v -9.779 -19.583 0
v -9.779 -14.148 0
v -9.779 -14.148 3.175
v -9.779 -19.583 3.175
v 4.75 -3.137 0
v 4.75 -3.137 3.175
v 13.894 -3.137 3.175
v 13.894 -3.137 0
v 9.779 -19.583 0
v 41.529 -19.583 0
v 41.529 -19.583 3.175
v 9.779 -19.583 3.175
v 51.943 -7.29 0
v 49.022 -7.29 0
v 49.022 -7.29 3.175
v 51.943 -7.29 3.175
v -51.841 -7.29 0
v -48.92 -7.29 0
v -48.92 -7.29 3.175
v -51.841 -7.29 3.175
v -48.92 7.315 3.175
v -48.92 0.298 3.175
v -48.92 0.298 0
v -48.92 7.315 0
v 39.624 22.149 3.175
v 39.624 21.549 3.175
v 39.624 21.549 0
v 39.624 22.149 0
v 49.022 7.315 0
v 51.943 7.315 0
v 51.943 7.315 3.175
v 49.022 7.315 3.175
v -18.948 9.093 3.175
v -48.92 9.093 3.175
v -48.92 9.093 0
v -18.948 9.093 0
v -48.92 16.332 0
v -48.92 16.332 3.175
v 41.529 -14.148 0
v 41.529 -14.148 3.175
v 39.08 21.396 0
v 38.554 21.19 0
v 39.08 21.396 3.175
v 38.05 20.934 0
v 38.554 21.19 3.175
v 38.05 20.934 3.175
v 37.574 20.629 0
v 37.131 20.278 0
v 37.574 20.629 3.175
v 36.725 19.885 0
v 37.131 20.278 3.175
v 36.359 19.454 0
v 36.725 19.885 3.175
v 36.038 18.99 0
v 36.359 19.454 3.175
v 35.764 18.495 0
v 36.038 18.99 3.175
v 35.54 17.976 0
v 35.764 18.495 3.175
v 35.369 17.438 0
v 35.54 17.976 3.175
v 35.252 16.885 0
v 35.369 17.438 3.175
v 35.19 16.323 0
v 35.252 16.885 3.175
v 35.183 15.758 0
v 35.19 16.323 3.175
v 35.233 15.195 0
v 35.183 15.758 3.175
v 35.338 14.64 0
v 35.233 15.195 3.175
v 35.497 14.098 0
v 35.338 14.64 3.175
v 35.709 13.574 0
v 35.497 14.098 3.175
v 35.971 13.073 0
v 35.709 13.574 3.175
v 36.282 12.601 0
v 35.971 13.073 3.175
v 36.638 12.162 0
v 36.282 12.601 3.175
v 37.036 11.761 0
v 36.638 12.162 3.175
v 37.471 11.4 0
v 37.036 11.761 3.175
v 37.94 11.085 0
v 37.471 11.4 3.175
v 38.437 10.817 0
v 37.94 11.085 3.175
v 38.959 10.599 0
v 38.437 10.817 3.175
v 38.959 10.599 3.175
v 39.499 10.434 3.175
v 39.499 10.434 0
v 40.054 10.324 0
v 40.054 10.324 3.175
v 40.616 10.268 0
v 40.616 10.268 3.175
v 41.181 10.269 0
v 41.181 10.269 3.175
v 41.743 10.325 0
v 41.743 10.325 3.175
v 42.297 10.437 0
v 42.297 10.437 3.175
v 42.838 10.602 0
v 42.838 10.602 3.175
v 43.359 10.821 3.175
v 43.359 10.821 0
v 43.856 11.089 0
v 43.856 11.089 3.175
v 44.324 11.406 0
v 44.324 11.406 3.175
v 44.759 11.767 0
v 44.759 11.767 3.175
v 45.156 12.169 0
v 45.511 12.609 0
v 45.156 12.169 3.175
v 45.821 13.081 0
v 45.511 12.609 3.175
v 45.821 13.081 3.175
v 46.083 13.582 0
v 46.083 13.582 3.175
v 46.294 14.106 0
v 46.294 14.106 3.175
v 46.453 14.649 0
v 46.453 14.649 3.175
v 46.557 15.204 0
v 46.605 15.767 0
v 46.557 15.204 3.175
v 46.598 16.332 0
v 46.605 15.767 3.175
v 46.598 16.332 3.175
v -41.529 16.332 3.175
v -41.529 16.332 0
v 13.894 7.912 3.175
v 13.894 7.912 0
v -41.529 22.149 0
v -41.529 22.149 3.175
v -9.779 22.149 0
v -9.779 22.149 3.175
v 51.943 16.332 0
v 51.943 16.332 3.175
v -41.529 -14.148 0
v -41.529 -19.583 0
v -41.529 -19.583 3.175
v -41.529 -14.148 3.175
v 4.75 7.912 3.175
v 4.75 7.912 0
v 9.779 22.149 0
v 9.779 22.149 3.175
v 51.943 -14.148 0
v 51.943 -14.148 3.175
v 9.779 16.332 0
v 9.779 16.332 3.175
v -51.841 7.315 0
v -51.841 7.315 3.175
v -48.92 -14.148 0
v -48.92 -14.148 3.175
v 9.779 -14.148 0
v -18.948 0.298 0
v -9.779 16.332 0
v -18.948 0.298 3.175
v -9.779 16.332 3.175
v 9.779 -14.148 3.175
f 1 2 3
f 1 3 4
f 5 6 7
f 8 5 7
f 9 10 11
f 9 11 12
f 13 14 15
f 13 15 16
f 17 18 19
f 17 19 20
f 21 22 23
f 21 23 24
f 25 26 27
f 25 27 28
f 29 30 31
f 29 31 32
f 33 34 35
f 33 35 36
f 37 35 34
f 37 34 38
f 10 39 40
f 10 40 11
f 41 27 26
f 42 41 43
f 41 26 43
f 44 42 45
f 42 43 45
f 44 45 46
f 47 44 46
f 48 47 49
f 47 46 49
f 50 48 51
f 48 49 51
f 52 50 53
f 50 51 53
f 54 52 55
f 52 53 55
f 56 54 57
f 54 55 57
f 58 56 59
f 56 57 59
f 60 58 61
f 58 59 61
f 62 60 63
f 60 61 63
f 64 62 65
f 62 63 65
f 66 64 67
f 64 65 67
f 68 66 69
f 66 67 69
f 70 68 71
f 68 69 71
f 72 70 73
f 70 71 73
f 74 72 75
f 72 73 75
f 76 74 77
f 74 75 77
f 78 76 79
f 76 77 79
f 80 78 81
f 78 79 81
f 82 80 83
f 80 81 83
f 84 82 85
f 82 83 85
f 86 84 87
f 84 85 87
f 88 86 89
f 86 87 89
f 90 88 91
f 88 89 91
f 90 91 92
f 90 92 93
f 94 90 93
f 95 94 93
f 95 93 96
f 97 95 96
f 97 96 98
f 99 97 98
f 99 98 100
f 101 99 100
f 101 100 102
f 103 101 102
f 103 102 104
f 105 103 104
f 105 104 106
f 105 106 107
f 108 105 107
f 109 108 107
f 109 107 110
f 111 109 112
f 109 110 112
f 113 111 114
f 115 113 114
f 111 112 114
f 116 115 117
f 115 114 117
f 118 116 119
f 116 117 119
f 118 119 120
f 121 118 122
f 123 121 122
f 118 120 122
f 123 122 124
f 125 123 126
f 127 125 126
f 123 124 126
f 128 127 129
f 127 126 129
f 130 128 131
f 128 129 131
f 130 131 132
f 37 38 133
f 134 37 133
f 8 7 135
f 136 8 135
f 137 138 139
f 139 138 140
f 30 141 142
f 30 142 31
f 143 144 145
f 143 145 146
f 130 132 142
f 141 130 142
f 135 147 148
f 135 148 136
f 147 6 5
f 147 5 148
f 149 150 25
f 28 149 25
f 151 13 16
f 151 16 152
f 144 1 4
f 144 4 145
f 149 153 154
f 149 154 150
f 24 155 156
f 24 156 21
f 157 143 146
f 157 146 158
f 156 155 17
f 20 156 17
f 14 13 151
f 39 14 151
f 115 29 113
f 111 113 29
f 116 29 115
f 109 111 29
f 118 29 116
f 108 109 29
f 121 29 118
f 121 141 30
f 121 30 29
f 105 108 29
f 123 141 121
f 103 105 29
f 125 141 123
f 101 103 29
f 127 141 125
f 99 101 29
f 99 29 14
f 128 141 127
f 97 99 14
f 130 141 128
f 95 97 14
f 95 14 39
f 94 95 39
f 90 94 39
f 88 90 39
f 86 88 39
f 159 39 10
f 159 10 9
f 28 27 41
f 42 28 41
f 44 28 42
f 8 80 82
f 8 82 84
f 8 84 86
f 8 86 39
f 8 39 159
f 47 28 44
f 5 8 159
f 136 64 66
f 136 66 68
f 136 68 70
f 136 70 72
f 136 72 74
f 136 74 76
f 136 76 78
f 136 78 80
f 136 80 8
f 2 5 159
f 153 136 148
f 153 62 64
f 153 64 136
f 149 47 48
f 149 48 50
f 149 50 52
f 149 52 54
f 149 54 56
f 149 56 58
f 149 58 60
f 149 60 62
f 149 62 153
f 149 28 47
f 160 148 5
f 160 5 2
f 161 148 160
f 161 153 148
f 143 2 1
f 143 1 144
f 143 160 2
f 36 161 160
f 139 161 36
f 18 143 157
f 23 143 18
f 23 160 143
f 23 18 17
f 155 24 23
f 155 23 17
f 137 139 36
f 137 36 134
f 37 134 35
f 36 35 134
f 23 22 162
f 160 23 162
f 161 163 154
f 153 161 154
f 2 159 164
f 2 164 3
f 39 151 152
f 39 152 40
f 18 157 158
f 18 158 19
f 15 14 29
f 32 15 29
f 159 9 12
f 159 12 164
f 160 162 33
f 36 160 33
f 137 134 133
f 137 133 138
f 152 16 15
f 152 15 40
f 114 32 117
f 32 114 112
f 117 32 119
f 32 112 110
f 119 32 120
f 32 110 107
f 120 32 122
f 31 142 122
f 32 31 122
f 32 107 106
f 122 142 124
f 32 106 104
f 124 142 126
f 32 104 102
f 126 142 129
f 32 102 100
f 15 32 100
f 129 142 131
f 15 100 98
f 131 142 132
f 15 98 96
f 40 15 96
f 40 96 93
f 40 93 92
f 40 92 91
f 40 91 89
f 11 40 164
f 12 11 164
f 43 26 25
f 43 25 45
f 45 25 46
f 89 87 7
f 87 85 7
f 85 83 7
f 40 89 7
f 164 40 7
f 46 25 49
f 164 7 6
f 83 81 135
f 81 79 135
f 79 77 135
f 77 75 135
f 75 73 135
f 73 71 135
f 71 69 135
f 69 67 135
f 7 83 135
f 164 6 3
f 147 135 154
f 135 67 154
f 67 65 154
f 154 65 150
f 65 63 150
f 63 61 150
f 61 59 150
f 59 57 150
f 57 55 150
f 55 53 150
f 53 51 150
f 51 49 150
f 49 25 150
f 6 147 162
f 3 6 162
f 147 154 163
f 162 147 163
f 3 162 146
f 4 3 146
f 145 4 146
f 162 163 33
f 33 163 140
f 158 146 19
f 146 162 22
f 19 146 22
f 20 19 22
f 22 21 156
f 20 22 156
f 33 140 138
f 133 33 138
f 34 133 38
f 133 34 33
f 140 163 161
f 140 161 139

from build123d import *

# Parameters (mm, degrees)
BOSS_EXTRUDE1_DEPTH = 3.175
SKETCH2_R           = 5.715
SKETCH2_W           = 29.972
SKETCH2_H           = 8.79475
SKETCH2_W_2         = 9.144
SKETCH2_H_2         = 11.049
CUT_EXTRUDE1_DEPTH  = 5.4356
SKETCH3_W           = 1.905
SKETCH3_H           = 1.235097614
CUT_EXTRUDE2_DEPTH  = 57.808955425
SKETCH4_W           = 5.501032945
SKETCH4_H           = 1.016
SKETCH4_W_2         = 19.558
SKETCH4_W_3         = 7.3914
CUT_EXTRUDE3_DEPTH  = 57.808955425
SKETCH5_W           = 31.75
SKETCH5_H           = 0.635
SKETCH5_W_2         = 29.845
CUT_EXTRUDE4_DEPTH  = 57.808955425


with BuildPart() as part:
    # Sketch1 → Boss-Extrude1 (new body)
    with BuildSketch(Plane.XY):
        Polygon((-51.8414, 0), (-51.8414, 7.3152), (-48.9204, 7.3152), (-48.9204, 17.3482), (-41.529, 17.3482), (-41.529, 22.7838), (-9.779, 22.7838), (-9.779, 17.3482), (9.779, 17.3482), (9.779, 22.7838), (41.529, 22.7838), (41.529, 17.3482), (51.943, 17.3482), (51.943, 7.3152), (49.022, 7.3152), (49.022, 0), (49.022, -7.2898), (51.943, -7.2898), (51.943, -14.1478), (41.529, -14.1478), (41.529, -19.5834), (9.779, -19.5834), (9.779, -14.1478), (-9.779, -14.1478), (-9.779, -19.5834), (-41.529, -19.5834), (-41.529, -14.1478), (-48.9204, -14.1478), (-48.9204, -7.2898), (-51.8414, -7.2898), align=None)
    extrude(amount=BOSS_EXTRUDE1_DEPTH)

    # Sketch2 → Cut-Extrude1 (cut)
    with BuildSketch(Plane.XY.offset(3.175)):
        with Locations((40.894, 15.9766)):
            Circle(SKETCH2_R)
        with Locations((-33.9344, 4.695825)):
            Rectangle(SKETCH2_W, SKETCH2_H)
        with Locations((9.3218, 2.3876)):
            Rectangle(SKETCH2_W_2, SKETCH2_H_2)
    extrude(amount=-CUT_EXTRUDE1_DEPTH, mode=Mode.SUBTRACT)

    # Sketch3 → Cut-Extrude2 (cut, through all)
    with BuildSketch(Plane.XY.offset(3.175)):
        with Locations((40.5765, 22.166251193)):
            Rectangle(SKETCH3_W, SKETCH3_H)
    extrude(amount=-CUT_EXTRUDE2_DEPTH, mode=Mode.SUBTRACT)

    # Sketch4 → Cut-Extrude3 (cut, through all)
    with BuildSketch(Plane.XY.offset(3.175)):
        with Locations((49.192483528, 16.8402)):
            Rectangle(SKETCH4_W, SKETCH4_H)
        with Locations((0, 16.8402)):
            Rectangle(SKETCH4_W_2, SKETCH4_H)
        with Locations((-45.2247, 16.8402)):
            Rectangle(SKETCH4_W_3, SKETCH4_H)
    extrude(amount=-CUT_EXTRUDE3_DEPTH, mode=Mode.SUBTRACT)

    # Sketch5 → Cut-Extrude4 (cut, through all)
    with BuildSketch(Plane.XY.offset(3.175)):
        with Locations((-25.654, 22.4663)):
            Rectangle(SKETCH5_W, SKETCH5_H)
        with Locations((24.7015, 22.4663)):
            Rectangle(SKETCH5_W_2, SKETCH5_H)
    extrude(amount=-CUT_EXTRUDE4_DEPTH, mode=Mode.SUBTRACT)


solid = part.part
